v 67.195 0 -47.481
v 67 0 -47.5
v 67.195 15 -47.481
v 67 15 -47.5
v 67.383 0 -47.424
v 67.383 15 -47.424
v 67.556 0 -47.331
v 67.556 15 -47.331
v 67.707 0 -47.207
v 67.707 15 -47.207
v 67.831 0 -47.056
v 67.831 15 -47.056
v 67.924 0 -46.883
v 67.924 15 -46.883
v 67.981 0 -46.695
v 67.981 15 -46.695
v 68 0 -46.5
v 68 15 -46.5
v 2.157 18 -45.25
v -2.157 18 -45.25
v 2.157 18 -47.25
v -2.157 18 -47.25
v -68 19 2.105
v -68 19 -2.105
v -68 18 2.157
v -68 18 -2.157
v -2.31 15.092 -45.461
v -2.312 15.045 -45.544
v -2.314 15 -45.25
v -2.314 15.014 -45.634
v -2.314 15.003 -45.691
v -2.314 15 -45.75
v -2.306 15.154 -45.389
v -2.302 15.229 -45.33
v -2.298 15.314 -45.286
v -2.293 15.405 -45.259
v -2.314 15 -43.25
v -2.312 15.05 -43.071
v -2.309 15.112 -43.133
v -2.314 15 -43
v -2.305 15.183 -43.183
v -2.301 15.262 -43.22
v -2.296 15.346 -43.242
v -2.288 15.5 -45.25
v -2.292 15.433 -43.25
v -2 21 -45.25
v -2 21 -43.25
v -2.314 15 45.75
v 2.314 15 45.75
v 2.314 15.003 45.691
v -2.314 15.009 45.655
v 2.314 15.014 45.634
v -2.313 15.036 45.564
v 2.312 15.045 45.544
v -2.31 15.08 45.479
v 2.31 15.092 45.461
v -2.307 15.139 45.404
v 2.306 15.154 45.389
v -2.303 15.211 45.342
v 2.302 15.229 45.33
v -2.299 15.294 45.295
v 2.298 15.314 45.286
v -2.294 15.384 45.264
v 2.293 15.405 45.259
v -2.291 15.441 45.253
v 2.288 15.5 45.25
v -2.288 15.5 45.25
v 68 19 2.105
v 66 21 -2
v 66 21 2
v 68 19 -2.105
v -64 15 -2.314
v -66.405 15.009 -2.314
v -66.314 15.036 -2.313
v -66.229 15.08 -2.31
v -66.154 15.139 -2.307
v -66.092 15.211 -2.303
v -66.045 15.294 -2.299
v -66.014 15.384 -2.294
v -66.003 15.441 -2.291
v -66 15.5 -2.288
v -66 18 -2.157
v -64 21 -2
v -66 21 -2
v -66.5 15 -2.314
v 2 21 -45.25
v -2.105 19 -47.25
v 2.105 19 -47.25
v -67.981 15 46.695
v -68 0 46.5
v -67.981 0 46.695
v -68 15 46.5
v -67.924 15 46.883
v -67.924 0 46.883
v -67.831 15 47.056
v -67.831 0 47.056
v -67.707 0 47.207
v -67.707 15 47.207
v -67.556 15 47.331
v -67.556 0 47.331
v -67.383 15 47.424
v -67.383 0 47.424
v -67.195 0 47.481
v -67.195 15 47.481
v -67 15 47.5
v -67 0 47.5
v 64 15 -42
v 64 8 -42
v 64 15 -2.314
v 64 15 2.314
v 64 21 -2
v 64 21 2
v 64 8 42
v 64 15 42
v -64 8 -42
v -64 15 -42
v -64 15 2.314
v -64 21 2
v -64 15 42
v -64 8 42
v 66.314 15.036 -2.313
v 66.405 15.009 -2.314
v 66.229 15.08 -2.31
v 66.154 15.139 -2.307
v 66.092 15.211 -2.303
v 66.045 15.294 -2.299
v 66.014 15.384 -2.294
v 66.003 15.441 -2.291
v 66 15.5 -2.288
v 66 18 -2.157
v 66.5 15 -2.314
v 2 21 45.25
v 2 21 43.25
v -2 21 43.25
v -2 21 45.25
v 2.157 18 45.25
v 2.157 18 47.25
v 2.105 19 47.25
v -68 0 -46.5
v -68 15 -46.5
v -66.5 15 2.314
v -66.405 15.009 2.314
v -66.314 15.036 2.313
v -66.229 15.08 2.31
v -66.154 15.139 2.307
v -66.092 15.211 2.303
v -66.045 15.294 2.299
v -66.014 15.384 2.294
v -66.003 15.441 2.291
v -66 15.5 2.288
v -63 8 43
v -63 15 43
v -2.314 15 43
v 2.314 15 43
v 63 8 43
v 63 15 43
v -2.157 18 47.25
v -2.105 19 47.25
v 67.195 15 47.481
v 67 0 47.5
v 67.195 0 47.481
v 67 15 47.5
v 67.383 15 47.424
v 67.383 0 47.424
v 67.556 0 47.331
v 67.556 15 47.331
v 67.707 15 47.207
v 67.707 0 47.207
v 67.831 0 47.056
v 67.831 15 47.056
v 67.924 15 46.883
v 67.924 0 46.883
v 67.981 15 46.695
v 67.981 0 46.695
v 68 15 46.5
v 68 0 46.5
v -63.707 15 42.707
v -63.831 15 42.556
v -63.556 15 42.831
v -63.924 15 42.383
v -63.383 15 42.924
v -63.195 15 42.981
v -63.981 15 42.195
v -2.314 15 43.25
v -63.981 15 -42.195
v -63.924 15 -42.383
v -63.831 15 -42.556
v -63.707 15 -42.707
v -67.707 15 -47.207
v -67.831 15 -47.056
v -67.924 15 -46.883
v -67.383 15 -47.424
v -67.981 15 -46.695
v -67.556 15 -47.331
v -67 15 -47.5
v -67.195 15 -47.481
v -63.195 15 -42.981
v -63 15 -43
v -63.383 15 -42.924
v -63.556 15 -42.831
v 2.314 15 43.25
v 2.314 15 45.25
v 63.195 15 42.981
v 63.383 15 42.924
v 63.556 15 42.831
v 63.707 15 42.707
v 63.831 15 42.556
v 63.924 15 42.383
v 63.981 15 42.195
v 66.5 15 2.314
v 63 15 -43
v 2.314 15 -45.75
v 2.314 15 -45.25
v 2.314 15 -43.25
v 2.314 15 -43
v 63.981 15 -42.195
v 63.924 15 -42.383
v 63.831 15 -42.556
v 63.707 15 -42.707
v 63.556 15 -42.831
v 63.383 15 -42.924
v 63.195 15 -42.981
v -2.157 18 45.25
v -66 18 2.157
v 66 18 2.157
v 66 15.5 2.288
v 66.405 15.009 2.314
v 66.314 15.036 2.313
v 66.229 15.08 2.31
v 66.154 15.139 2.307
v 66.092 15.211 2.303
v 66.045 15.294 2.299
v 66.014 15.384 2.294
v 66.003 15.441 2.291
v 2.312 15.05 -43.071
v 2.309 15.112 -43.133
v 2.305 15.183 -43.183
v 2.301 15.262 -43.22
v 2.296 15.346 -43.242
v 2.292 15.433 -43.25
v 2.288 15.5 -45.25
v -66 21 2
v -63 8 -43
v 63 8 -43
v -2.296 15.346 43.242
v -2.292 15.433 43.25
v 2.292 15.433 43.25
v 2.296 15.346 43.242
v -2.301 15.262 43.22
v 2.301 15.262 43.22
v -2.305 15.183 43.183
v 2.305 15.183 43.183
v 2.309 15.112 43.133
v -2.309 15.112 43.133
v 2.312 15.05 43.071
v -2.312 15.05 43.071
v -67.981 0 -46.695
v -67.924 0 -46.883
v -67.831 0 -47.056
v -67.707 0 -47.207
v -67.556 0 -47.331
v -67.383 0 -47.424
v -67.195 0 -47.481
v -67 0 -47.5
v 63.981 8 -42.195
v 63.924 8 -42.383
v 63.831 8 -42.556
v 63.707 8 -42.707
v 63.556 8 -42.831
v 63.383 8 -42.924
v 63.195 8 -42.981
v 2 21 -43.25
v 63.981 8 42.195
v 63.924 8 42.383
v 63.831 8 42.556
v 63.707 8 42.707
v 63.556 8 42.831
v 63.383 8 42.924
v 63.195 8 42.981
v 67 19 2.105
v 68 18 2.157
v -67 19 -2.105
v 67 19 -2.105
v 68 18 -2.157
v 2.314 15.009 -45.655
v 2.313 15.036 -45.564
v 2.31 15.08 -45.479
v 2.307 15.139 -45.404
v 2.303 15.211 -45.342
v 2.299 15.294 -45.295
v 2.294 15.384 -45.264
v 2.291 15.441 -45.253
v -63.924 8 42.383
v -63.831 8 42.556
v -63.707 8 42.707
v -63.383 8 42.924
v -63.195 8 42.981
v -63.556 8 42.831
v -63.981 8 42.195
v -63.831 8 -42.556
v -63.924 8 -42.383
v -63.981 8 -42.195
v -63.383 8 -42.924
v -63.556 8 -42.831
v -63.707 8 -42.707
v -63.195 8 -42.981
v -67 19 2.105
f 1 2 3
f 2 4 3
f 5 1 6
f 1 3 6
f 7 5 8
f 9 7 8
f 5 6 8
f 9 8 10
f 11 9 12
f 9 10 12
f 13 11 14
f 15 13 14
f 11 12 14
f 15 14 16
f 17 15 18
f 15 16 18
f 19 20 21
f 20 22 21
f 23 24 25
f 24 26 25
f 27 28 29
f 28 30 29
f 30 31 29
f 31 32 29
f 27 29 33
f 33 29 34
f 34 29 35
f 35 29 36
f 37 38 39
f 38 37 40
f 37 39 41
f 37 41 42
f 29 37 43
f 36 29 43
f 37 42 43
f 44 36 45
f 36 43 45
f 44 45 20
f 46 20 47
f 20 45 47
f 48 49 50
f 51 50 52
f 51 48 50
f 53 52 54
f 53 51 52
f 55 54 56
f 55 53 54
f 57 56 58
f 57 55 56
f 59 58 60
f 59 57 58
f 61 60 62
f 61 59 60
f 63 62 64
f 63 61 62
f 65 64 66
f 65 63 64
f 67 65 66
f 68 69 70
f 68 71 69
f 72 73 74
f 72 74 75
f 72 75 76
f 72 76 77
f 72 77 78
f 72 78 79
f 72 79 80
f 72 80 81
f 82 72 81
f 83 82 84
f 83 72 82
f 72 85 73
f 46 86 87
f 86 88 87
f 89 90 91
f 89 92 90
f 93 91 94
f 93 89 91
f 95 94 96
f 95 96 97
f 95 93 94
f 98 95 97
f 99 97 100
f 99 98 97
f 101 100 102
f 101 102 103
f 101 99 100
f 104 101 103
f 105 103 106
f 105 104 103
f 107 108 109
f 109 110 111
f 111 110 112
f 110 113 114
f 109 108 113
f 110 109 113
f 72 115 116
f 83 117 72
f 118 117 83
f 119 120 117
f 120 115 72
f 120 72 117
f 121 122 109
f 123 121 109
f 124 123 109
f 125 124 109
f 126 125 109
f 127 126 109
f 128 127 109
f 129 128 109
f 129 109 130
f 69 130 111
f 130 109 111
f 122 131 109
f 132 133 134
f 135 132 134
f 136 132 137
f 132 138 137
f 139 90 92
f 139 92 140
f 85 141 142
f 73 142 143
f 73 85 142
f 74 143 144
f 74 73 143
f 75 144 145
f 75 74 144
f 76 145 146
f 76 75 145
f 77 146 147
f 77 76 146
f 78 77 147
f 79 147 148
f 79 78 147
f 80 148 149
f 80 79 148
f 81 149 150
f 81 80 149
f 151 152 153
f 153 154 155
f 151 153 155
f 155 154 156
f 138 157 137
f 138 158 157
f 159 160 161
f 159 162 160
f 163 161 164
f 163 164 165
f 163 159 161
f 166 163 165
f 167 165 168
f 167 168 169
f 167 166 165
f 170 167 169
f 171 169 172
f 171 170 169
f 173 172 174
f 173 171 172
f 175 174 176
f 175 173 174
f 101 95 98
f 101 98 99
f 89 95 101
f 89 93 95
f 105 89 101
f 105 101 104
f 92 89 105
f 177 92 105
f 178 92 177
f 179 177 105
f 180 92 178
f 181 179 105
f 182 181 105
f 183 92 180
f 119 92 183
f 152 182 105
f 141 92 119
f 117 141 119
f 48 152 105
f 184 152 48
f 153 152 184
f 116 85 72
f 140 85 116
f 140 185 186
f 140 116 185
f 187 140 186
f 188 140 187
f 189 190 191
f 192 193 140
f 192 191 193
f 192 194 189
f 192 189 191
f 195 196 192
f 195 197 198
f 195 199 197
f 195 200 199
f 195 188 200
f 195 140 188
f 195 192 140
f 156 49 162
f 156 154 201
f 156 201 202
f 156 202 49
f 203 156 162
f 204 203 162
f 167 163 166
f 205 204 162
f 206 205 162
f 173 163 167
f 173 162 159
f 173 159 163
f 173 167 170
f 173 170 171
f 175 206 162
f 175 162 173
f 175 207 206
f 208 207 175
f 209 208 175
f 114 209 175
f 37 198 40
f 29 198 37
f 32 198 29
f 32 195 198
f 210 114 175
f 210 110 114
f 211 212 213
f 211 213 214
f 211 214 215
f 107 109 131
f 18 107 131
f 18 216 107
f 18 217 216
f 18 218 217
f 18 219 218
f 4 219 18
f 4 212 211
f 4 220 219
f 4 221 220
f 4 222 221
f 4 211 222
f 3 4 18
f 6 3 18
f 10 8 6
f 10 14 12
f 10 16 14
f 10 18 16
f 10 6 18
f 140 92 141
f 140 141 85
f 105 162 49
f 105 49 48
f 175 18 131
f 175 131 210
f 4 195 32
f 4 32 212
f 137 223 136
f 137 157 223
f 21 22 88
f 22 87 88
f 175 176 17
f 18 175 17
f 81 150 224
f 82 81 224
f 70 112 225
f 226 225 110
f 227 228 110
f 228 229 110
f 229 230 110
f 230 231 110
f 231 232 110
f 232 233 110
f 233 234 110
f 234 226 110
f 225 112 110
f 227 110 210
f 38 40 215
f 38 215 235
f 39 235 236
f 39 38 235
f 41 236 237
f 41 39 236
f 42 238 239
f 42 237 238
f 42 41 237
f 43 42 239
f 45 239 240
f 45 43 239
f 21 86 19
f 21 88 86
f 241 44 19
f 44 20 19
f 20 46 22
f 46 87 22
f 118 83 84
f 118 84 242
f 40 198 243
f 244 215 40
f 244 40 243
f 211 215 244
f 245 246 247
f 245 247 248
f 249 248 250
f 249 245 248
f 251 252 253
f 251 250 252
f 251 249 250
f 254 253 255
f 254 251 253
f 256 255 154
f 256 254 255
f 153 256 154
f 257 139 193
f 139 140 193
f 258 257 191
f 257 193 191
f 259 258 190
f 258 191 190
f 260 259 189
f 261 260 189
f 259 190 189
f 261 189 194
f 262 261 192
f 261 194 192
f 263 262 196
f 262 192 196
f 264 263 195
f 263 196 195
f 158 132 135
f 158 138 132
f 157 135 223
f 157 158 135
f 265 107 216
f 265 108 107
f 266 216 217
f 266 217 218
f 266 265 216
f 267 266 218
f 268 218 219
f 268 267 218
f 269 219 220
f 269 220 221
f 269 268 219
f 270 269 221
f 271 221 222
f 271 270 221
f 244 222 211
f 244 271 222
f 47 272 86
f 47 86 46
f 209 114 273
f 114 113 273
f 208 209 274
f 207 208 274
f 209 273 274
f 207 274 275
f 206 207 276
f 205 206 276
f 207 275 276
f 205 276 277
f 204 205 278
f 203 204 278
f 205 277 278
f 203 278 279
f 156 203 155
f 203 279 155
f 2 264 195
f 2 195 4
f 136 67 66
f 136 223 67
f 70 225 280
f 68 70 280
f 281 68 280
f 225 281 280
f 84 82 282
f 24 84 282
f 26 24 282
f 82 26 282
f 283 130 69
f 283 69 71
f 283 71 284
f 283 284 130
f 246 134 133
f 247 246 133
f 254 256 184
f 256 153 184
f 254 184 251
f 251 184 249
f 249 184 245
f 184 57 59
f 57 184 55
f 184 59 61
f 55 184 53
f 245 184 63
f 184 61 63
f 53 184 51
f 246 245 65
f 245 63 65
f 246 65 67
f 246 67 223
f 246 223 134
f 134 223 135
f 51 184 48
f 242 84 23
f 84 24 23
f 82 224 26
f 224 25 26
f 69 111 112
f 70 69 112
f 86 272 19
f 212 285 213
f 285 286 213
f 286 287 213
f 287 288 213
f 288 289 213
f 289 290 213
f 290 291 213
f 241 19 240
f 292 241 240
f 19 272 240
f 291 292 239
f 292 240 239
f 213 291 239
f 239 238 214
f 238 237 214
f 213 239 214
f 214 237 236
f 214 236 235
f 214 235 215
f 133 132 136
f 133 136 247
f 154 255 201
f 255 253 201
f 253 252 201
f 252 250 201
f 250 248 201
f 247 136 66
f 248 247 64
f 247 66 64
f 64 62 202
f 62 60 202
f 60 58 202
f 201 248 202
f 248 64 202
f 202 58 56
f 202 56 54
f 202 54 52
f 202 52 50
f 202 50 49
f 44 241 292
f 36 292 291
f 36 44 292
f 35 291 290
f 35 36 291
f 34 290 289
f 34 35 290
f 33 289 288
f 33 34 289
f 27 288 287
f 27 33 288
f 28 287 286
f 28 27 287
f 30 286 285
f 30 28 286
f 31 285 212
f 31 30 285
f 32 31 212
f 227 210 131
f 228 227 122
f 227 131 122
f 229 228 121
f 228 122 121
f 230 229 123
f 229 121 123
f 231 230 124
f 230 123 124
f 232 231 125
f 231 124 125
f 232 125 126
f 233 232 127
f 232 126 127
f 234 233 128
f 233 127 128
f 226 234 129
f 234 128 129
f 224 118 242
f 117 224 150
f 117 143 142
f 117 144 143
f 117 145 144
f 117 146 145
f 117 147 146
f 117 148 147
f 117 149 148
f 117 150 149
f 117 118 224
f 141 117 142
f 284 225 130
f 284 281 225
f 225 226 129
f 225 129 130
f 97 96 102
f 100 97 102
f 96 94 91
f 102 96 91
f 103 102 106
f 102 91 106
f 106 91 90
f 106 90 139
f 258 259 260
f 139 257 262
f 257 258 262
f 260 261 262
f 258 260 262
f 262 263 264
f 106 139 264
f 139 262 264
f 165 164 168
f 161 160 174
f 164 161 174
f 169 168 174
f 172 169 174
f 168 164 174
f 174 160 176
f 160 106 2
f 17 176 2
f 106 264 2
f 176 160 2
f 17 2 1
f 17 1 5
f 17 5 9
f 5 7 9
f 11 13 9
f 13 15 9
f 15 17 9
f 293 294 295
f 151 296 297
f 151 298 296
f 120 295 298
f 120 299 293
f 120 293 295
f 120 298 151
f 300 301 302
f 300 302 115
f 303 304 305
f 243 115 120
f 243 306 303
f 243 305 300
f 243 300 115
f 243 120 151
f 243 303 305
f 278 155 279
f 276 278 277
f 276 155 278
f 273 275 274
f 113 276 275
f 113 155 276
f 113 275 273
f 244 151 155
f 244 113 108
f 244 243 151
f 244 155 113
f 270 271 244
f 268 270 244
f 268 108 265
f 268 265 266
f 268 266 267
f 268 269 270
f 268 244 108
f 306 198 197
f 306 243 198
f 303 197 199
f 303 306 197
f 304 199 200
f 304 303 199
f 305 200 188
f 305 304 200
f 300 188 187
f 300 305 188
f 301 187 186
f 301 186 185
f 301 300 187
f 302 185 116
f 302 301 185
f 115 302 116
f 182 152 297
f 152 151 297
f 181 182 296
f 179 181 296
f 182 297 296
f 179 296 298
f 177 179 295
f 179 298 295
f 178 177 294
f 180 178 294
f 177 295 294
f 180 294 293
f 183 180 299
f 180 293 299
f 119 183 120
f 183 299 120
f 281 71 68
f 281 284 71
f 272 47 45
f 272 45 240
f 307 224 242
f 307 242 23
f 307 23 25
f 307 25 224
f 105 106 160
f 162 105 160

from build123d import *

# Parameters (mm, degrees)
SKETCH1_W            = 136
SKETCH1_H            = 95
BOSS_EXTRUDE1_DEPTH  = 15
SKETCH2_W            = 128
SKETCH2_H            = 86
CUT_EXTRUDE1_DEPTH   = 7
SNAP_START           = 64
SNAP_HOOK2_DEPTH     = 2
SNAP_HOOK2_2_DEPTH   = 2
FILLET1_R            = 1
FILLET2_R            = 0.5
FILLET2_OF_MIRROR1_R = 0.5
SNAP_START_2         = 43.25
SNAP_HOOK3_DEPTH     = 2
FILLET3_R            = 0.5
FILLET3_OF_MIRROR2_R = 0.5


with BuildPart() as part:
    # Sketch1 → Boss-Extrude1 (new body)
    with BuildSketch(Plane(origin=(0, 0, 0), x_dir=(1, 0, 0), z_dir=(0, 1, 0))):
        Rectangle(SKETCH1_W, SKETCH1_H)
    extrude(amount=BOSS_EXTRUDE1_DEPTH)

    # Sketch2 → Cut-Extrude1 (cut)
    with BuildSketch(Plane(origin=(0, 15, 0), x_dir=(1, 0, 0), z_dir=(0, 1, 0))):
        Rectangle(SKETCH2_W, SKETCH2_H)
    extrude(amount=-CUT_EXTRUDE1_DEPTH, mode=Mode.SUBTRACT)



with BuildPart() as body_2:
    # Snap Hook2: read off the stored shape, not the designer's step
    # Snap Hook2 outline → Snap Hook2 (new body)
    with BuildSketch(Plane.YZ.offset(SNAP_START)):
        Polygon((21, -2), (21, 2), (18, 2.157223338), (18, -2.157223338), align=None)
    snap_hook2 = extrude(amount=SNAP_HOOK2_DEPTH)


with BuildPart() as part_1:
    add(part.part)

    add(body_2.part)  # Snap Hook2 2 merges body 2
    # Snap Hook2 2 outline → Snap Hook2 2 (add)
    with BuildSketch(Plane.YZ.offset(SNAP_START)):
        Polygon((18, -2.157223338), (18, 2.157223338), (15, 2.314446676), (15, -2.314446676), align=None)
    snap_hook2_2 = extrude(amount=SNAP_HOOK2_2_DEPTH)

    # Snap Hook2 3: loft between two sections, ruled curve by curve
    snap_hook2_3_from = [
        Edge.make_line((66, 21, -2), (66, 21, 2)),
        Edge.make_line((66, 18, 2.157223338), (66, 18, -2.157223338)),
        Edge.make_line((66, 18, 2.157223338), (66, 21, 2)),
        Edge.make_line((66, 18, -2.157223338), (66, 21, -2)),
    ]
    snap_hook2_3_to = [
        Edge.make_line((68, 19, -2.104815559), (68, 19, 2.104815559)),
        Edge.make_line((68, 18, 2.157223338), (68, 18, -2.157223338)),
        Edge.make_line((68, 18, 2.157223338), (68, 19, 2.104815559)),
        Edge.make_line((68, 18, -2.157223338), (68, 19, -2.104815559)),
    ]
    snap_hook2_3 = Solid(Shell([*[Face.make_surface_from_curves(snap_hook2_3_from[k], snap_hook2_3_to[k]) for k in range(4)], Face(Wire(snap_hook2_3_from)), Face(Wire(snap_hook2_3_to))]))
    add(snap_hook2_3)

    # Fillet1
    fillet1_edges = [part_1.edges().sort_by_distance(p)[0] for p in [
        (-64, 11.5, 43),
        (-64, 11.5, -43),
        (64, 11.5, -43),
        (64, 11.5, 43),
        (68, 7.5, 47.5),
        (68, 7.5, -47.5),
        (-68, 7.5, -47.5),
        (-68, 7.5, 47.5),
    ]]
    fillet(fillet1_edges, radius=FILLET1_R)

    # Fillet2
    fillet2_edges = [part_1.edges().sort_by_distance(p)[0] for p in [
        (66, 15, 0),
    ]]
    fillet(fillet2_edges, radius=FILLET2_R)

    # Mirror1: Snap Hook2, Snap Hook2 2, Snap Hook2 3 across plane
    add(snap_hook2.mirror(Plane(origin=(0, 0, 0), x_dir=(0, 0, 1), z_dir=(1, 0, 0))))
    add(snap_hook2_2.mirror(Plane(origin=(0, 0, 0), x_dir=(0, 0, 1), z_dir=(1, 0, 0))))
    add(snap_hook2_3.mirror(Plane(origin=(0, 0, 0), x_dir=(0, 0, 1), z_dir=(1, 0, 0))))

    # Fillet2 of Mirror1
    fillet2_of_mirror1_edges = [part_1.edges().sort_by_distance(p)[0] for p in [
        (-66, 15, 0),
    ]]
    fillet(fillet2_of_mirror1_edges, radius=FILLET2_OF_MIRROR1_R)

    # Snap Hook3: read off the stored shape, not the designer's step
    # Snap Hook3 outline → Snap Hook3 (add)
    with BuildSketch(Plane.XY.offset(SNAP_START_2)):
        Polygon((2, 21), (-2, 21), (-2.314446676, 15), (2.314446676, 15), align=None)
    snap_hook3 = extrude(amount=SNAP_HOOK3_DEPTH)

    # Snap Hook3 2: loft between two sections, ruled curve by curve
    snap_hook3_2_from = [
        Edge.make_line((-2.157223338, 18, 45.25), (2.157223338, 18, 45.25)),
        Edge.make_line((2, 21, 45.25), (-2, 21, 45.25)),
        Edge.make_line((2, 21, 45.25), (2.157223338, 18, 45.25)),
        Edge.make_line((-2, 21, 45.25), (-2.157223338, 18, 45.25)),
    ]
    snap_hook3_2_to = [
        Edge.make_line((-2.157223338, 18, 47.25), (2.157223338, 18, 47.25)),
        Edge.make_line((2.104815559, 19, 47.25), (-2.104815559, 19, 47.25)),
        Edge.make_line((2.104815559, 19, 47.25), (2.157223338, 18, 47.25)),
        Edge.make_line((-2.104815559, 19, 47.25), (-2.157223338, 18, 47.25)),
    ]
    snap_hook3_2 = Solid(Shell([*[Face.make_surface_from_curves(snap_hook3_2_from[k], snap_hook3_2_to[k]) for k in range(4)], Face(Wire(snap_hook3_2_from)), Face(Wire(snap_hook3_2_to))]))
    add(snap_hook3_2)

    # Fillet3
    # the kernel refuses this fillet: 0.5 mm, written as the material it adds along each edge
    with BuildSketch(Plane(origin=(-3.564446676, 15, 45.25), x_dir=(0, 0, 1), z_dir=(1, 0, 0))) as fillet3_piece_1_section:
        with BuildLine():
            CenterArc((FILLET3_R, -FILLET3_R), FILLET3_R, 90, 90)
            Line((0, -FILLET3_R), (-FILLET3_R * 0.02, -FILLET3_R))
            Line((-FILLET3_R * 0.02, -FILLET3_R), (-FILLET3_R * 0.02, FILLET3_R * 0.02))
            Line((-FILLET3_R * 0.02, FILLET3_R * 0.02), (FILLET3_R, FILLET3_R * 0.02))
            Line((FILLET3_R, FILLET3_R * 0.02), (FILLET3_R, 0))
        make_face()
    fillet3_piece_1 = extrude(amount=7.128893352, mode=Mode.PRIVATE)
    fillet3_piece_1 = split(fillet3_piece_1, bisect_by=Plane(origin=(2.29834408, 15.307255844, 45.25), z_dir=(-0.998629534751949, -0.05233595629302951, 0)), keep=Keep.TOP, mode=Mode.PRIVATE)
    fillet3_piece_1 = split(fillet3_piece_1, bisect_by=Plane(origin=(-2.317870491, 14.93466971, 45.25), z_dir=(0.998629534751949, -0.05233595629302951, 0)), keep=Keep.TOP, mode=Mode.PRIVATE)
    add(fillet3_piece_1)
    with BuildSketch(Plane(origin=(-3.396978431, 15, 43.25), x_dir=(0, 0, -1), z_dir=(1, 0, 0))) as fillet3_piece_2_section:
        with BuildLine():
            CenterArc((0.5, 0.433012702), FILLET3_R, 180, 60)
            Line((0, 0.433012702), (-0.01, 0.433012702))
            Line((-0.01, 0.433012702), (-0.01, 0))
            Line((-0.01, 0), (0, -0.01))
            ThreePointArc((0, -0.01), (0.125, -0.01), (0.245, -0.008660254))
            Line((0.245, -0.008660254), (0.25, 0))
        make_face()
    fillet3_piece_2 = extrude(amount=6.793956861, mode=Mode.PRIVATE)
    fillet3_piece_2 = split(fillet3_piece_2, bisect_by=Plane(origin=(2.298802784, 15.298503245, 43.25), z_dir=(-0.998629534751949, -0.05233595629302951, 0)), keep=Keep.TOP, mode=Mode.PRIVATE)
    fillet3_piece_2 = split(fillet3_piece_2, bisect_by=Plane(origin=(-2.317411787, 14.94342231, 43.25), z_dir=(0.998629534751949, -0.05233595629302951, 0)), keep=Keep.TOP, mode=Mode.PRIVATE)
    add(fillet3_piece_2)

    # Mirror2: Snap Hook3, Snap Hook3 2 across plane
    add(snap_hook3.mirror(Plane.XY))
    add(snap_hook3_2.mirror(Plane.XY))

    # Fillet3 of Mirror2
    # the kernel refuses this fillet: 0.5 mm, written as the material it adds along each edge
    with BuildSketch(Plane(origin=(-3.564446676, 15, -45.25), x_dir=(0, 0, -1), z_dir=(1, 0, 0))) as fillet3_of_mirror2_piece_1_section:
        with BuildLine():
            CenterArc((FILLET3_OF_MIRROR2_R, FILLET3_OF_MIRROR2_R), FILLET3_OF_MIRROR2_R, 180, 90)
            Line((0, FILLET3_OF_MIRROR2_R), (-FILLET3_OF_MIRROR2_R * 0.02, FILLET3_OF_MIRROR2_R))
            Line((-FILLET3_OF_MIRROR2_R * 0.02, FILLET3_OF_MIRROR2_R), (-FILLET3_OF_MIRROR2_R * 0.02, -FILLET3_OF_MIRROR2_R * 0.02))
            Line((-FILLET3_OF_MIRROR2_R * 0.02, -FILLET3_OF_MIRROR2_R * 0.02), (FILLET3_OF_MIRROR2_R, -FILLET3_OF_MIRROR2_R * 0.02))
            Line((FILLET3_OF_MIRROR2_R, -FILLET3_OF_MIRROR2_R * 0.02), (FILLET3_OF_MIRROR2_R, 0))
        make_face()
    fillet3_of_mirror2_piece_1 = extrude(amount=7.128893352, mode=Mode.PRIVATE)
    fillet3_of_mirror2_piece_1 = split(fillet3_of_mirror2_piece_1, bisect_by=Plane(origin=(-2.317870491, 14.93466971, -45.25), z_dir=(0.998629534751949, -0.05233595629302951, 0)), keep=Keep.TOP, mode=Mode.PRIVATE)
    fillet3_of_mirror2_piece_1 = split(fillet3_of_mirror2_piece_1, bisect_by=Plane(origin=(2.29834408, 15.307255844, -45.25), z_dir=(-0.998629534751949, -0.05233595629302951, 0)), keep=Keep.TOP, mode=Mode.PRIVATE)
    add(fillet3_of_mirror2_piece_1)
    with BuildSketch(Plane(origin=(-3.396978431, 15, -43.25), x_dir=(0, 0, 1), z_dir=(1, 0, 0))) as fillet3_of_mirror2_piece_2_section:
        with BuildLine():
            CenterArc((0.5, -0.433012702), FILLET3_OF_MIRROR2_R, 120, 60)
            Line((0, -0.433012702), (-0.01, -0.433012702))
            Line((-0.01, -0.433012702), (-0.01, 0))
            Line((-0.01, 0), (0, 0.01))
            ThreePointArc((0, 0.01), (0.125, 0.01), (0.245, 0.008660254))
            Line((0.245, 0.008660254), (0.25, 0))
        make_face()
    fillet3_of_mirror2_piece_2 = extrude(amount=6.793956861, mode=Mode.PRIVATE)
    fillet3_of_mirror2_piece_2 = split(fillet3_of_mirror2_piece_2, bisect_by=Plane(origin=(-2.317411787, 14.94342231, -43.25), z_dir=(0.998629534751949, -0.05233595629302951, 0)), keep=Keep.TOP, mode=Mode.PRIVATE)
    fillet3_of_mirror2_piece_2 = split(fillet3_of_mirror2_piece_2, bisect_by=Plane(origin=(2.298802784, 15.298503245, -43.25), z_dir=(-0.998629534751949, -0.05233595629302951, 0)), keep=Keep.TOP, mode=Mode.PRIVATE)
    add(fillet3_of_mirror2_piece_2)


solid = part_1.part
